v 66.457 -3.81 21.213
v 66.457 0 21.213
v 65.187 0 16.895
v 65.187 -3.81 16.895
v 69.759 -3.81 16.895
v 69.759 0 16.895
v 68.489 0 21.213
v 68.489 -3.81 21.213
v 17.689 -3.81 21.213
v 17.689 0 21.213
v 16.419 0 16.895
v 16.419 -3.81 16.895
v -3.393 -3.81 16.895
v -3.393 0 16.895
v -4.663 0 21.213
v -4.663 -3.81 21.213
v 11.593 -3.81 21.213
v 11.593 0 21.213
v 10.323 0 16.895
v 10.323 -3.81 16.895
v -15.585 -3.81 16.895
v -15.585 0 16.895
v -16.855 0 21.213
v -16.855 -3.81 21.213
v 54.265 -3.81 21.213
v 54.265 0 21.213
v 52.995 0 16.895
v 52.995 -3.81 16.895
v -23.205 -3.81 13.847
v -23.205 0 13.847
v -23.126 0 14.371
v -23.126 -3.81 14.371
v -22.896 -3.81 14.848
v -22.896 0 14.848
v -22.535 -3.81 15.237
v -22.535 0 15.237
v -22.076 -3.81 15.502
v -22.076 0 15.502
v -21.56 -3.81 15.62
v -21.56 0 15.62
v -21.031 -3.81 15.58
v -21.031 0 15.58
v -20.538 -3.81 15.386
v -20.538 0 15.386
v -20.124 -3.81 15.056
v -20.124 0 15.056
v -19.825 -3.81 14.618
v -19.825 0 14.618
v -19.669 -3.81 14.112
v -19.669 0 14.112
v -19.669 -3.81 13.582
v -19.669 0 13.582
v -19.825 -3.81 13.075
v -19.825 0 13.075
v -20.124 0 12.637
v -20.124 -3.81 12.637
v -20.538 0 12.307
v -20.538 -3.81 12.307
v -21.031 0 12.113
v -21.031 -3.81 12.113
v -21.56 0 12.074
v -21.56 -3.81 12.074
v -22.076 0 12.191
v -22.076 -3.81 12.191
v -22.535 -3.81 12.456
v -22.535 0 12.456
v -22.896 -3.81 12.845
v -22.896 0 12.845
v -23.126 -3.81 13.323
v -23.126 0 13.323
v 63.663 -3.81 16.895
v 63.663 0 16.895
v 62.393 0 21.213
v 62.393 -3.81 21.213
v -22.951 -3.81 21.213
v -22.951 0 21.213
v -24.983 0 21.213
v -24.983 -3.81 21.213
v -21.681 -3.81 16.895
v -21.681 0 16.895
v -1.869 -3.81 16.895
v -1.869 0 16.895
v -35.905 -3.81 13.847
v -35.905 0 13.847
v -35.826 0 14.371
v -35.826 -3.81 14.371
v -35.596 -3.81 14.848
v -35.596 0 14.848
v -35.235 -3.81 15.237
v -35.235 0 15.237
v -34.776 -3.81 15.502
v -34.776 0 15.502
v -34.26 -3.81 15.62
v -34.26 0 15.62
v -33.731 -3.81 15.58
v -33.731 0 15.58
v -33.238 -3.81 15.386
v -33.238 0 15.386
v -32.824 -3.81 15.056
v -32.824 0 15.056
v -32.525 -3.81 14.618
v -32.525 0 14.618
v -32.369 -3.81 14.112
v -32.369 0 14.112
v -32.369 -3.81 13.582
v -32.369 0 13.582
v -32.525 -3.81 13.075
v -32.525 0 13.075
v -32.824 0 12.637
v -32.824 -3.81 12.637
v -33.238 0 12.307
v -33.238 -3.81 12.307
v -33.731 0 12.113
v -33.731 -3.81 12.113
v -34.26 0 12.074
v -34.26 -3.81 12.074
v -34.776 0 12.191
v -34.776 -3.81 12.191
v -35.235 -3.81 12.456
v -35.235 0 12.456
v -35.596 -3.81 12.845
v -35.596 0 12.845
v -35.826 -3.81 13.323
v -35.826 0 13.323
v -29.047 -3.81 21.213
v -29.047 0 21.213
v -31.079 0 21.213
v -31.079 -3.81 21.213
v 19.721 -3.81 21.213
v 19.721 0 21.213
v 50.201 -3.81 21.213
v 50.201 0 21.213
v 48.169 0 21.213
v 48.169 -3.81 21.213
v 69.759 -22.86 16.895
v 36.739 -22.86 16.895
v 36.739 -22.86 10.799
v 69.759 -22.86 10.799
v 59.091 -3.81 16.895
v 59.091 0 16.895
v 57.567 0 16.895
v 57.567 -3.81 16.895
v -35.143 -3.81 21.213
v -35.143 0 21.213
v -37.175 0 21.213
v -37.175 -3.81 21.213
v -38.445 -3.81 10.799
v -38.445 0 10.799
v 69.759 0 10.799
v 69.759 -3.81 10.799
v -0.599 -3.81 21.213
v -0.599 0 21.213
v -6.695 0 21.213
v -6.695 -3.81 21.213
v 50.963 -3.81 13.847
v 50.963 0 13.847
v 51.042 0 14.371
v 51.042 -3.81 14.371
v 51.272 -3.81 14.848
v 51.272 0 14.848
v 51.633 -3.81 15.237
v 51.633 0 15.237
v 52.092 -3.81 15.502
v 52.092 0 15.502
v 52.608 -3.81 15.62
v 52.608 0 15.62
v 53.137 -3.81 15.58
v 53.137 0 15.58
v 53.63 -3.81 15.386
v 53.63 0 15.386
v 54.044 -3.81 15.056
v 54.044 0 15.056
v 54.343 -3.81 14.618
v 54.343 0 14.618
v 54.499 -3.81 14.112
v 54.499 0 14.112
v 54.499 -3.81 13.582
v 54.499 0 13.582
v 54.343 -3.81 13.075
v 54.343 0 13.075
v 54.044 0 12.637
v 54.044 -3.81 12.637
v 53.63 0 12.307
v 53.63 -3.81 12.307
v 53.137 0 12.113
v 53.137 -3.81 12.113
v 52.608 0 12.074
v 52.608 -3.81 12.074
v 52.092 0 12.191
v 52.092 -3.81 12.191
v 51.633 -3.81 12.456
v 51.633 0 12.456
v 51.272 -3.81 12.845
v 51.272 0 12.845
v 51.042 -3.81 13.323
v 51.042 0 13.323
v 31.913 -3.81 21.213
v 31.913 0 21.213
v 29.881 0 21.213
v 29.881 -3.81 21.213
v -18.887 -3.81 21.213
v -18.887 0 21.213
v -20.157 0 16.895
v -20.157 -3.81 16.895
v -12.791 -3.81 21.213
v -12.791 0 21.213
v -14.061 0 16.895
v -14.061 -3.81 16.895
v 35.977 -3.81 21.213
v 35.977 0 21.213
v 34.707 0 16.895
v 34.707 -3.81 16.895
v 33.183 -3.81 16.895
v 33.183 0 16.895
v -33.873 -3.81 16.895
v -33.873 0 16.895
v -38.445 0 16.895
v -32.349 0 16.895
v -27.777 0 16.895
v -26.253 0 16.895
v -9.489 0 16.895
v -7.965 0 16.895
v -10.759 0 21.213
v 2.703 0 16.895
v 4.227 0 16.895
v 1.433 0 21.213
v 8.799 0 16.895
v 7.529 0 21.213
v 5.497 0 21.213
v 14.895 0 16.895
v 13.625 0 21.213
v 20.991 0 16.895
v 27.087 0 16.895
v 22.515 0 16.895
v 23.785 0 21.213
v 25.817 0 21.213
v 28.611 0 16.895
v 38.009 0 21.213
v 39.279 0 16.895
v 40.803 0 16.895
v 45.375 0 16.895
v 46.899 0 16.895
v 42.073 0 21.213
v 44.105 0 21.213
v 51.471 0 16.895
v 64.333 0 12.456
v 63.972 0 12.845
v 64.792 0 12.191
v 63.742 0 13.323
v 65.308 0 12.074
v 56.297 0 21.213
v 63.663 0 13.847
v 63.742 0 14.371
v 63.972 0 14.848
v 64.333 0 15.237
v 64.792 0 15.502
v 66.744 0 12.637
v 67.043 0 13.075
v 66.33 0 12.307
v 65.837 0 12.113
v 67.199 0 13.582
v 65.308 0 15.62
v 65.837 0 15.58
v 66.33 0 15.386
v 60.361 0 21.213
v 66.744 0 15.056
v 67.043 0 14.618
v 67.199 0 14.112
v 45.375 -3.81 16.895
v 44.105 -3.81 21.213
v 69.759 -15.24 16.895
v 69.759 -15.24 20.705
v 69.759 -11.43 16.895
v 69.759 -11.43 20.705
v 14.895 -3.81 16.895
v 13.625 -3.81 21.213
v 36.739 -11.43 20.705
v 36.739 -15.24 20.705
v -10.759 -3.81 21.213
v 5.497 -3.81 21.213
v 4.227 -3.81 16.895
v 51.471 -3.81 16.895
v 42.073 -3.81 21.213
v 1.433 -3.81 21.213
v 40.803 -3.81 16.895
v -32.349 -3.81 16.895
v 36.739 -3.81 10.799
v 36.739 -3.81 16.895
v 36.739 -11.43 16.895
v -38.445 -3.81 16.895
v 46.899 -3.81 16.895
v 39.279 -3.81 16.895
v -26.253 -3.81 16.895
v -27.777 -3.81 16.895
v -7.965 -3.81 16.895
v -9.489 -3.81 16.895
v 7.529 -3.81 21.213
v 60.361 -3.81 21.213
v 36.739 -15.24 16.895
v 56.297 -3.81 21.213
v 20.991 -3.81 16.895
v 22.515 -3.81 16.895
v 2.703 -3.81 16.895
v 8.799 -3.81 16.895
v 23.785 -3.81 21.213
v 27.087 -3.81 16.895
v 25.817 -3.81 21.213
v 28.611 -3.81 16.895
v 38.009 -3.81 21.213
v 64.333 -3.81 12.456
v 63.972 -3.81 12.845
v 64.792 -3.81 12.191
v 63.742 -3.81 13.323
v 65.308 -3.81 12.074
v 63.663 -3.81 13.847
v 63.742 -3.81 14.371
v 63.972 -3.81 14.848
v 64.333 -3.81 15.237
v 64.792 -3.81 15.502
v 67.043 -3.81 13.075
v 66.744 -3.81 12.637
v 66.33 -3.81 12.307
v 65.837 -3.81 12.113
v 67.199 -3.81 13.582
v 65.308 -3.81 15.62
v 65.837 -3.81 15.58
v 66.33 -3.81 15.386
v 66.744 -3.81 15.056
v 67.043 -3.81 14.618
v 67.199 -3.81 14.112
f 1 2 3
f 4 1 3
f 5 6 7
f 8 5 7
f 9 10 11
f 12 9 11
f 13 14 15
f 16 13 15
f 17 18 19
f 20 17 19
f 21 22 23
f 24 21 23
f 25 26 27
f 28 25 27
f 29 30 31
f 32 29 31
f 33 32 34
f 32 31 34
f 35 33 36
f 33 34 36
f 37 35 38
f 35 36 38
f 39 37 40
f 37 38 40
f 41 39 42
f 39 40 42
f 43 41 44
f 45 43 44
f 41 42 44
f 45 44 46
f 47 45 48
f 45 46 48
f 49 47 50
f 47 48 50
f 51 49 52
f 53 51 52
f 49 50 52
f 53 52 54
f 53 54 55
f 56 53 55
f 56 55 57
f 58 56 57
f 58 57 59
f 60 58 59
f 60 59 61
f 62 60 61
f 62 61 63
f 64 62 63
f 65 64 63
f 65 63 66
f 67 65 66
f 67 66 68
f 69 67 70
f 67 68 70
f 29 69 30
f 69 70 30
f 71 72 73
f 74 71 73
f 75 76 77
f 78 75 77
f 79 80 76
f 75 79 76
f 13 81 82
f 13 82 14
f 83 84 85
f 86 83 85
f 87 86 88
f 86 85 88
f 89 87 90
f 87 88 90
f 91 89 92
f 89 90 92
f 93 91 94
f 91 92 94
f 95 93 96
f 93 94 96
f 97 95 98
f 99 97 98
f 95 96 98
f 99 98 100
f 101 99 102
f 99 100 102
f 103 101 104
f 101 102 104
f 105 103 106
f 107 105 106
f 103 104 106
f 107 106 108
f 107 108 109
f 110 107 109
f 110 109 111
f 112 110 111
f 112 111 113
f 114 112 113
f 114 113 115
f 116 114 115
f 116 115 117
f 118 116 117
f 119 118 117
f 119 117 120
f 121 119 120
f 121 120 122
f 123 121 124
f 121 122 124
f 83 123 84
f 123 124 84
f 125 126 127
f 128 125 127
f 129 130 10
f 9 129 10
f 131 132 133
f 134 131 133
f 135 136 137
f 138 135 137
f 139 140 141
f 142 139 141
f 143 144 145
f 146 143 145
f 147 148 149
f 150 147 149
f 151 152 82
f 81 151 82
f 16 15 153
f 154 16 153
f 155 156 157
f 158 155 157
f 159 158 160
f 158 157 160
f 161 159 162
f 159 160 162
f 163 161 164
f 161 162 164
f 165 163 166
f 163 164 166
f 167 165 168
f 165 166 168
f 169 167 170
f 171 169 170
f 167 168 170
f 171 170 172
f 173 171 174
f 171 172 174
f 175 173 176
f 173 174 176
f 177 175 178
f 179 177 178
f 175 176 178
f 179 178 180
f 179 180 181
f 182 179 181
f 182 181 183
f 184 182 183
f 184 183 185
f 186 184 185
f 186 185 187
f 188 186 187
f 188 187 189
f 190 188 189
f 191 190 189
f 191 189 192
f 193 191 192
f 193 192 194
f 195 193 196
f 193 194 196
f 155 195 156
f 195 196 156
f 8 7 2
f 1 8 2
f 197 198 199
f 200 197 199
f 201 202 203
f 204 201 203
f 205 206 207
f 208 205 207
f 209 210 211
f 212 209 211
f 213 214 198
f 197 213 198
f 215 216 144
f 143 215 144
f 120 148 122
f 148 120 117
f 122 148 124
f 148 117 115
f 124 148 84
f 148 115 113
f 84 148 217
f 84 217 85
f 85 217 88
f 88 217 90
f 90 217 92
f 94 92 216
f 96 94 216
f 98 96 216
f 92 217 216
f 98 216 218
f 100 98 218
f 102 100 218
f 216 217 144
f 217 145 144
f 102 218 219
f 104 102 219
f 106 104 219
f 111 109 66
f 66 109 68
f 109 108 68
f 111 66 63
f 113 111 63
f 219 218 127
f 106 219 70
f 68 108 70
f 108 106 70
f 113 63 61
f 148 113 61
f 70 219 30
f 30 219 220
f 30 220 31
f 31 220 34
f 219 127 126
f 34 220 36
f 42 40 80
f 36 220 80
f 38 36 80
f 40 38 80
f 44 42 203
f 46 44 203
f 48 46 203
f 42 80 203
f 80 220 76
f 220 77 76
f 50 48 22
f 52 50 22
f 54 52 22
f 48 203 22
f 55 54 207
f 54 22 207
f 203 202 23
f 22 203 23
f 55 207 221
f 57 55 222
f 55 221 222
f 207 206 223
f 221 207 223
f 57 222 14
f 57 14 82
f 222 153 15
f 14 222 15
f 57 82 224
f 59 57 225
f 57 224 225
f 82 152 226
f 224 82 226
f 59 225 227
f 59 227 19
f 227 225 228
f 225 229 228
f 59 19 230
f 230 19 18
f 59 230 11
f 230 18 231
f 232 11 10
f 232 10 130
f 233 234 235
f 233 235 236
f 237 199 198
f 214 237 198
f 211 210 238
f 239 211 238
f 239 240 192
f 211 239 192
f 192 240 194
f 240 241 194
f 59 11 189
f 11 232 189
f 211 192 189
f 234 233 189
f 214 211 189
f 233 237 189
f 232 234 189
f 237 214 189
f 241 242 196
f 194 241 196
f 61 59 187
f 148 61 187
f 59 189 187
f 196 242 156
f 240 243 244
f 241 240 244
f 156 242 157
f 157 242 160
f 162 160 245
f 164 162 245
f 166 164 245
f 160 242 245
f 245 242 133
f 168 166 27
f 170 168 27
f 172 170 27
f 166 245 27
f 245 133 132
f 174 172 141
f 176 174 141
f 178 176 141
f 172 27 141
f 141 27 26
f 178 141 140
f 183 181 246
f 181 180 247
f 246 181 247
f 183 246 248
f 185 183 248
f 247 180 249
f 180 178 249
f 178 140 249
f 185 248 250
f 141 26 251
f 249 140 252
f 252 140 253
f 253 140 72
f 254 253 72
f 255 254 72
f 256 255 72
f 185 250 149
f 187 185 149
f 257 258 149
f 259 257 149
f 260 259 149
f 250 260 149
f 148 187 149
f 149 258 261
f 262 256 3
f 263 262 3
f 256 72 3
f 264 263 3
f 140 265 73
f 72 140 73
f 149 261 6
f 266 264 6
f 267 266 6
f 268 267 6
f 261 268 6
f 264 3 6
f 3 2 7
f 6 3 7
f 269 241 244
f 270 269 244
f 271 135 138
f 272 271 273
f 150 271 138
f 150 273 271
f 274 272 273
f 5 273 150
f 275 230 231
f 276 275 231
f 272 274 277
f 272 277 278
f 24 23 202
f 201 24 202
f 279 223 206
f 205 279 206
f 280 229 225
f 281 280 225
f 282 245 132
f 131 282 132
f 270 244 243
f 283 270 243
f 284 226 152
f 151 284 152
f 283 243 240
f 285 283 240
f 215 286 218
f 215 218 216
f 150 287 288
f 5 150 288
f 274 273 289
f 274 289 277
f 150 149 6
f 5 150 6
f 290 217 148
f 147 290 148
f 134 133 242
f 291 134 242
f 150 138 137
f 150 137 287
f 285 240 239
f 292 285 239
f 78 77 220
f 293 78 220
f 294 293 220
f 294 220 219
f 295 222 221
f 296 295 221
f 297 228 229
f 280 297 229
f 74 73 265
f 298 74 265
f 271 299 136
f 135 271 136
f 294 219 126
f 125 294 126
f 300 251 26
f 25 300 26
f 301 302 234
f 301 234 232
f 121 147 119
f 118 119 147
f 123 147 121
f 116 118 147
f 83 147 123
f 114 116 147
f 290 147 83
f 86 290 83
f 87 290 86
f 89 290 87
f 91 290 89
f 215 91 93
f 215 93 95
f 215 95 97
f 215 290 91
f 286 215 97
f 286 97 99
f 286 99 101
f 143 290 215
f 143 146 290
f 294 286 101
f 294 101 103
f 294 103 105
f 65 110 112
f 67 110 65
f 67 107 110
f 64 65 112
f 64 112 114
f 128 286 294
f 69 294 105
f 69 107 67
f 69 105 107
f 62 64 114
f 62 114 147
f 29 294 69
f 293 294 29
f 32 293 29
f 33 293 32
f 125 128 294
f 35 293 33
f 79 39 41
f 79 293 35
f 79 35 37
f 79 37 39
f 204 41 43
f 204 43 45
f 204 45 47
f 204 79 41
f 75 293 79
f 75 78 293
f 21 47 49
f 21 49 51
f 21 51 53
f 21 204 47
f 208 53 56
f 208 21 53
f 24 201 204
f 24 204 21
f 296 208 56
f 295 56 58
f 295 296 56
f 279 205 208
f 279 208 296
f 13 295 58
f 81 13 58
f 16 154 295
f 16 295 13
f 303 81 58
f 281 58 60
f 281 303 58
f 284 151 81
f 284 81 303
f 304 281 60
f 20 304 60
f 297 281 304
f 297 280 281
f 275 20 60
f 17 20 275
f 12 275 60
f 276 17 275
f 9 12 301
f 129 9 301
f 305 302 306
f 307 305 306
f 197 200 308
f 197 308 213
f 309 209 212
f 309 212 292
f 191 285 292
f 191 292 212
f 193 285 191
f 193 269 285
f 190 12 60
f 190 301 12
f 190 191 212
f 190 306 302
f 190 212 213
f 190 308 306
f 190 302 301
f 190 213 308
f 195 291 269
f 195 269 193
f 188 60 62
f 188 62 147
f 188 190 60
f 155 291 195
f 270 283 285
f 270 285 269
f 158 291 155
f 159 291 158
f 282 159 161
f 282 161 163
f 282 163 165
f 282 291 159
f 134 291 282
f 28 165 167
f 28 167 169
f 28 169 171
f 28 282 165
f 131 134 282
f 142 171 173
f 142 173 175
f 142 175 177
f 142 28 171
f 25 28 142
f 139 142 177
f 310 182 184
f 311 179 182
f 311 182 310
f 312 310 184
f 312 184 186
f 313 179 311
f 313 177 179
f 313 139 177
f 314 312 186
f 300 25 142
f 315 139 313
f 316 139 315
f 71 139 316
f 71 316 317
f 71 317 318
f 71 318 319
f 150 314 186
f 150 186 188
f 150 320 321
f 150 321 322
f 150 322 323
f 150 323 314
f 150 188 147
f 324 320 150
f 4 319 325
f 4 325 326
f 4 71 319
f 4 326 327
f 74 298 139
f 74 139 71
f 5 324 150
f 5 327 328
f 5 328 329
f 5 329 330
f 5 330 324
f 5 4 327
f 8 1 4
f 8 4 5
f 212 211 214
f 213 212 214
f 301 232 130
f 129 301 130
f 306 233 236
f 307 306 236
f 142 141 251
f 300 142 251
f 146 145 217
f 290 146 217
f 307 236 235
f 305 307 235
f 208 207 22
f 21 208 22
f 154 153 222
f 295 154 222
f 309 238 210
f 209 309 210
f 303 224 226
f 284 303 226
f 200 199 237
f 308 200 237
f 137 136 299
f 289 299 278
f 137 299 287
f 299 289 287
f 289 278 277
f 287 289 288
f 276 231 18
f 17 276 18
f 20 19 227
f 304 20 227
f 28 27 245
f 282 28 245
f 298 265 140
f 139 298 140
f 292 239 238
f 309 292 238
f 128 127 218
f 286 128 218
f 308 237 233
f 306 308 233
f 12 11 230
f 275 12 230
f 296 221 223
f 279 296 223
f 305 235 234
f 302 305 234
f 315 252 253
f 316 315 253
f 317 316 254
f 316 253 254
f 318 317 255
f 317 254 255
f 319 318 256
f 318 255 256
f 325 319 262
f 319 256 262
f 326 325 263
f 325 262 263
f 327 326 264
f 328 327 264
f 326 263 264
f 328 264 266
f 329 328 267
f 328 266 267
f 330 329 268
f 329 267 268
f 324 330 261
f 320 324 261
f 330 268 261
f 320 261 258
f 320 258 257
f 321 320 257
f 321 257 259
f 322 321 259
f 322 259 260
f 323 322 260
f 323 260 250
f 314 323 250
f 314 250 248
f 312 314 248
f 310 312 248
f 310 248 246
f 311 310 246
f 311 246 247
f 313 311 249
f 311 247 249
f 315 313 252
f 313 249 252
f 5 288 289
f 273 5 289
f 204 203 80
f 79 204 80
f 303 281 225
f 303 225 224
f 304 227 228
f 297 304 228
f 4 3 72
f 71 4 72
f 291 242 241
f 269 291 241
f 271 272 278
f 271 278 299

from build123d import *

# Parameters (mm, degrees)
F1_DEPTH = 3.81
F2_R     = 1.778
F3_DEPTH = 3.81
F6_DEPTH = 33.02


with BuildPart() as f1:
    # F0 (on Front) → F1 (new body)
    with BuildSketch(Plane.XZ):
        Polygon((-38.4448663006, 16.8945933835), (-38.4448663006, 10.7985933835), (69.7591336994, 10.7985933835), (69.7591336994, 16.8945933835), (65.1871336994, 16.8945933835), (63.6631336994, 16.8945933835), (59.0911336994, 16.8945933835), (57.5671336994, 16.8945933835), (52.9951336994, 16.8945933835), (51.4711336994, 16.8945933835), (46.8991336994, 16.8945933835), (45.3751336994, 16.8945933835), (40.8031336994, 16.8945933835), (39.2791336994, 16.8945933835), (34.7071336994, 16.8945933835), (33.1831336994, 16.8945933835), (28.6111336994, 16.8945933835), (27.0871336994, 16.8945933835), (22.5151336994, 16.8945933835), (20.9911336994, 16.8945933835), (16.4191336994, 16.8945933835), (14.8951336994, 16.8945933835), (10.3231336994, 16.8945933835), (8.7991336994, 16.8945933835), (4.2271336994, 16.8945933835), (2.7031336994, 16.8945933835), (-1.8688663006, 16.8945933835), (-3.3928663006, 16.8945933835), (-7.9648663006, 16.8945933835), (-9.4888663006, 16.8945933835), (-14.0608663006, 16.8945933835), (-15.5848663006, 16.8945933835), (-20.1568663006, 16.8945933835), (-21.6808663006, 16.8945933835), (-26.2528663006, 16.8945933835), (-27.7768663006, 16.8945933835), (-32.3488663006, 16.8945933835), (-33.8728663006, 16.8945933835), align=None)
        Polygon((-37.1748663006, 21.2125933835), (-38.4448663006, 16.8945933835), (-33.8728663006, 16.8945933835), (-35.1428663006, 21.2125933835), align=None)
        Polygon((65.1871336994, 16.8945933835), (69.7591336994, 16.8945933835), (68.4891336994, 21.2125933835), (66.4571336994, 21.2125933835), align=None)
        Polygon((-31.0788663006, 21.2125933835), (-32.3488663006, 16.8945933835), (-27.7768663006, 16.8945933835), (-29.0468663006, 21.2125933835), align=None)
        Polygon((59.0911336994, 16.8945933835), (63.6631336994, 16.8945933835), (62.3931336994, 21.2125933835), (60.3611336994, 21.2125933835), align=None)
        Polygon((-24.9828663006, 21.2125933835), (-26.2528663006, 16.8945933835), (-21.6808663006, 16.8945933835), (-22.9508663006, 21.2125933835), align=None)
        Polygon((52.9951336994, 16.8945933835), (57.5671336994, 16.8945933835), (56.2971336994, 21.2125933835), (54.2651336994, 21.2125933835), align=None)
        Polygon((-18.8868663006, 21.2125933835), (-20.1568663006, 16.8945933835), (-15.5848663006, 16.8945933835), (-16.8548663006, 21.2125933835), align=None)
        Polygon((46.8991336994, 16.8945933835), (51.4711336994, 16.8945933835), (50.2011336994, 21.2125933835), (48.1691336994, 21.2125933835), align=None)
        Polygon((-12.7908663006, 21.2125933835), (-14.0608663006, 16.8945933835), (-9.4888663006, 16.8945933835), (-10.7588663006, 21.2125933835), align=None)
        Polygon((40.8031336994, 16.8945933835), (45.3751336994, 16.8945933835), (44.1051336994, 21.2125933835), (42.0731336994, 21.2125933835), align=None)
        Polygon((-6.6948663006, 21.2125933835), (-7.9648663006, 16.8945933835), (-3.3928663006, 16.8945933835), (-4.6628663006, 21.2125933835), align=None)
        Polygon((34.7071336994, 16.8945933835), (39.2791336994, 16.8945933835), (38.0091336994, 21.2125933835), (35.9771336994, 21.2125933835), align=None)
        Polygon((-0.5988663006, 21.2125933835), (-1.8688663006, 16.8945933835), (2.7031336994, 16.8945933835), (1.4331336994, 21.2125933835), align=None)
        Polygon((28.6111336994, 16.8945933835), (33.1831336994, 16.8945933835), (31.9131336994, 21.2125933835), (29.8811336994, 21.2125933835), align=None)
        Polygon((5.4971336994, 21.2125933835), (4.2271336994, 16.8945933835), (8.7991336994, 16.8945933835), (7.5291336994, 21.2125933835), align=None)
        Polygon((22.5151336994, 16.8945933835), (27.0871336994, 16.8945933835), (25.8171336994, 21.2125933835), (23.7851336994, 21.2125933835), align=None)
        Polygon((11.5931336994, 21.2125933835), (10.3231336994, 16.8945933835), (14.8951336994, 16.8945933835), (13.6251336994, 21.2125933835), align=None)
        Polygon((16.4191336994, 16.8945933835), (20.9911336994, 16.8945933835), (19.7211336994, 21.2125933835), (17.6891336994, 21.2125933835), align=None)
    extrude(amount=F1_DEPTH)

    # F2 (on face) → F3 (cut, through all)
    with BuildSketch(Plane(origin=(0, 0, 0), x_dir=(-1, 0, 0), z_dir=(0, 1, 0))):
        with Locations((-52.7411336994, 13.8465933835)):
            Circle(F2_R)
        with Locations((-65.4411336994, 13.8465933835)):
            Circle(F2_R)
        with Locations((21.4268663006, 13.8465933835)):
            Circle(F2_R)
        with Locations((34.1268663006, 13.8465933835)):
            Circle(F2_R)
    extrude(amount=-F3_DEPTH, mode=Mode.SUBTRACT)


with BuildPart() as f6:
    # F5 (on plane+point) → F6 (new body)
    with BuildSketch(Plane.YZ.offset(69.7591336994)):
        Polygon((-22.86, 10.7985933835), (-3.81, 10.7985933835), (-3.81, 16.8945933835), (-11.43, 16.8945933835), (-11.43, 20.7045933835), (-15.24, 20.7045933835), (-15.24, 16.8945933835), (-22.86, 16.8945933835), align=None)
    extrude(amount=-F6_DEPTH)


solid = Compound([f1.part, f6.part])
